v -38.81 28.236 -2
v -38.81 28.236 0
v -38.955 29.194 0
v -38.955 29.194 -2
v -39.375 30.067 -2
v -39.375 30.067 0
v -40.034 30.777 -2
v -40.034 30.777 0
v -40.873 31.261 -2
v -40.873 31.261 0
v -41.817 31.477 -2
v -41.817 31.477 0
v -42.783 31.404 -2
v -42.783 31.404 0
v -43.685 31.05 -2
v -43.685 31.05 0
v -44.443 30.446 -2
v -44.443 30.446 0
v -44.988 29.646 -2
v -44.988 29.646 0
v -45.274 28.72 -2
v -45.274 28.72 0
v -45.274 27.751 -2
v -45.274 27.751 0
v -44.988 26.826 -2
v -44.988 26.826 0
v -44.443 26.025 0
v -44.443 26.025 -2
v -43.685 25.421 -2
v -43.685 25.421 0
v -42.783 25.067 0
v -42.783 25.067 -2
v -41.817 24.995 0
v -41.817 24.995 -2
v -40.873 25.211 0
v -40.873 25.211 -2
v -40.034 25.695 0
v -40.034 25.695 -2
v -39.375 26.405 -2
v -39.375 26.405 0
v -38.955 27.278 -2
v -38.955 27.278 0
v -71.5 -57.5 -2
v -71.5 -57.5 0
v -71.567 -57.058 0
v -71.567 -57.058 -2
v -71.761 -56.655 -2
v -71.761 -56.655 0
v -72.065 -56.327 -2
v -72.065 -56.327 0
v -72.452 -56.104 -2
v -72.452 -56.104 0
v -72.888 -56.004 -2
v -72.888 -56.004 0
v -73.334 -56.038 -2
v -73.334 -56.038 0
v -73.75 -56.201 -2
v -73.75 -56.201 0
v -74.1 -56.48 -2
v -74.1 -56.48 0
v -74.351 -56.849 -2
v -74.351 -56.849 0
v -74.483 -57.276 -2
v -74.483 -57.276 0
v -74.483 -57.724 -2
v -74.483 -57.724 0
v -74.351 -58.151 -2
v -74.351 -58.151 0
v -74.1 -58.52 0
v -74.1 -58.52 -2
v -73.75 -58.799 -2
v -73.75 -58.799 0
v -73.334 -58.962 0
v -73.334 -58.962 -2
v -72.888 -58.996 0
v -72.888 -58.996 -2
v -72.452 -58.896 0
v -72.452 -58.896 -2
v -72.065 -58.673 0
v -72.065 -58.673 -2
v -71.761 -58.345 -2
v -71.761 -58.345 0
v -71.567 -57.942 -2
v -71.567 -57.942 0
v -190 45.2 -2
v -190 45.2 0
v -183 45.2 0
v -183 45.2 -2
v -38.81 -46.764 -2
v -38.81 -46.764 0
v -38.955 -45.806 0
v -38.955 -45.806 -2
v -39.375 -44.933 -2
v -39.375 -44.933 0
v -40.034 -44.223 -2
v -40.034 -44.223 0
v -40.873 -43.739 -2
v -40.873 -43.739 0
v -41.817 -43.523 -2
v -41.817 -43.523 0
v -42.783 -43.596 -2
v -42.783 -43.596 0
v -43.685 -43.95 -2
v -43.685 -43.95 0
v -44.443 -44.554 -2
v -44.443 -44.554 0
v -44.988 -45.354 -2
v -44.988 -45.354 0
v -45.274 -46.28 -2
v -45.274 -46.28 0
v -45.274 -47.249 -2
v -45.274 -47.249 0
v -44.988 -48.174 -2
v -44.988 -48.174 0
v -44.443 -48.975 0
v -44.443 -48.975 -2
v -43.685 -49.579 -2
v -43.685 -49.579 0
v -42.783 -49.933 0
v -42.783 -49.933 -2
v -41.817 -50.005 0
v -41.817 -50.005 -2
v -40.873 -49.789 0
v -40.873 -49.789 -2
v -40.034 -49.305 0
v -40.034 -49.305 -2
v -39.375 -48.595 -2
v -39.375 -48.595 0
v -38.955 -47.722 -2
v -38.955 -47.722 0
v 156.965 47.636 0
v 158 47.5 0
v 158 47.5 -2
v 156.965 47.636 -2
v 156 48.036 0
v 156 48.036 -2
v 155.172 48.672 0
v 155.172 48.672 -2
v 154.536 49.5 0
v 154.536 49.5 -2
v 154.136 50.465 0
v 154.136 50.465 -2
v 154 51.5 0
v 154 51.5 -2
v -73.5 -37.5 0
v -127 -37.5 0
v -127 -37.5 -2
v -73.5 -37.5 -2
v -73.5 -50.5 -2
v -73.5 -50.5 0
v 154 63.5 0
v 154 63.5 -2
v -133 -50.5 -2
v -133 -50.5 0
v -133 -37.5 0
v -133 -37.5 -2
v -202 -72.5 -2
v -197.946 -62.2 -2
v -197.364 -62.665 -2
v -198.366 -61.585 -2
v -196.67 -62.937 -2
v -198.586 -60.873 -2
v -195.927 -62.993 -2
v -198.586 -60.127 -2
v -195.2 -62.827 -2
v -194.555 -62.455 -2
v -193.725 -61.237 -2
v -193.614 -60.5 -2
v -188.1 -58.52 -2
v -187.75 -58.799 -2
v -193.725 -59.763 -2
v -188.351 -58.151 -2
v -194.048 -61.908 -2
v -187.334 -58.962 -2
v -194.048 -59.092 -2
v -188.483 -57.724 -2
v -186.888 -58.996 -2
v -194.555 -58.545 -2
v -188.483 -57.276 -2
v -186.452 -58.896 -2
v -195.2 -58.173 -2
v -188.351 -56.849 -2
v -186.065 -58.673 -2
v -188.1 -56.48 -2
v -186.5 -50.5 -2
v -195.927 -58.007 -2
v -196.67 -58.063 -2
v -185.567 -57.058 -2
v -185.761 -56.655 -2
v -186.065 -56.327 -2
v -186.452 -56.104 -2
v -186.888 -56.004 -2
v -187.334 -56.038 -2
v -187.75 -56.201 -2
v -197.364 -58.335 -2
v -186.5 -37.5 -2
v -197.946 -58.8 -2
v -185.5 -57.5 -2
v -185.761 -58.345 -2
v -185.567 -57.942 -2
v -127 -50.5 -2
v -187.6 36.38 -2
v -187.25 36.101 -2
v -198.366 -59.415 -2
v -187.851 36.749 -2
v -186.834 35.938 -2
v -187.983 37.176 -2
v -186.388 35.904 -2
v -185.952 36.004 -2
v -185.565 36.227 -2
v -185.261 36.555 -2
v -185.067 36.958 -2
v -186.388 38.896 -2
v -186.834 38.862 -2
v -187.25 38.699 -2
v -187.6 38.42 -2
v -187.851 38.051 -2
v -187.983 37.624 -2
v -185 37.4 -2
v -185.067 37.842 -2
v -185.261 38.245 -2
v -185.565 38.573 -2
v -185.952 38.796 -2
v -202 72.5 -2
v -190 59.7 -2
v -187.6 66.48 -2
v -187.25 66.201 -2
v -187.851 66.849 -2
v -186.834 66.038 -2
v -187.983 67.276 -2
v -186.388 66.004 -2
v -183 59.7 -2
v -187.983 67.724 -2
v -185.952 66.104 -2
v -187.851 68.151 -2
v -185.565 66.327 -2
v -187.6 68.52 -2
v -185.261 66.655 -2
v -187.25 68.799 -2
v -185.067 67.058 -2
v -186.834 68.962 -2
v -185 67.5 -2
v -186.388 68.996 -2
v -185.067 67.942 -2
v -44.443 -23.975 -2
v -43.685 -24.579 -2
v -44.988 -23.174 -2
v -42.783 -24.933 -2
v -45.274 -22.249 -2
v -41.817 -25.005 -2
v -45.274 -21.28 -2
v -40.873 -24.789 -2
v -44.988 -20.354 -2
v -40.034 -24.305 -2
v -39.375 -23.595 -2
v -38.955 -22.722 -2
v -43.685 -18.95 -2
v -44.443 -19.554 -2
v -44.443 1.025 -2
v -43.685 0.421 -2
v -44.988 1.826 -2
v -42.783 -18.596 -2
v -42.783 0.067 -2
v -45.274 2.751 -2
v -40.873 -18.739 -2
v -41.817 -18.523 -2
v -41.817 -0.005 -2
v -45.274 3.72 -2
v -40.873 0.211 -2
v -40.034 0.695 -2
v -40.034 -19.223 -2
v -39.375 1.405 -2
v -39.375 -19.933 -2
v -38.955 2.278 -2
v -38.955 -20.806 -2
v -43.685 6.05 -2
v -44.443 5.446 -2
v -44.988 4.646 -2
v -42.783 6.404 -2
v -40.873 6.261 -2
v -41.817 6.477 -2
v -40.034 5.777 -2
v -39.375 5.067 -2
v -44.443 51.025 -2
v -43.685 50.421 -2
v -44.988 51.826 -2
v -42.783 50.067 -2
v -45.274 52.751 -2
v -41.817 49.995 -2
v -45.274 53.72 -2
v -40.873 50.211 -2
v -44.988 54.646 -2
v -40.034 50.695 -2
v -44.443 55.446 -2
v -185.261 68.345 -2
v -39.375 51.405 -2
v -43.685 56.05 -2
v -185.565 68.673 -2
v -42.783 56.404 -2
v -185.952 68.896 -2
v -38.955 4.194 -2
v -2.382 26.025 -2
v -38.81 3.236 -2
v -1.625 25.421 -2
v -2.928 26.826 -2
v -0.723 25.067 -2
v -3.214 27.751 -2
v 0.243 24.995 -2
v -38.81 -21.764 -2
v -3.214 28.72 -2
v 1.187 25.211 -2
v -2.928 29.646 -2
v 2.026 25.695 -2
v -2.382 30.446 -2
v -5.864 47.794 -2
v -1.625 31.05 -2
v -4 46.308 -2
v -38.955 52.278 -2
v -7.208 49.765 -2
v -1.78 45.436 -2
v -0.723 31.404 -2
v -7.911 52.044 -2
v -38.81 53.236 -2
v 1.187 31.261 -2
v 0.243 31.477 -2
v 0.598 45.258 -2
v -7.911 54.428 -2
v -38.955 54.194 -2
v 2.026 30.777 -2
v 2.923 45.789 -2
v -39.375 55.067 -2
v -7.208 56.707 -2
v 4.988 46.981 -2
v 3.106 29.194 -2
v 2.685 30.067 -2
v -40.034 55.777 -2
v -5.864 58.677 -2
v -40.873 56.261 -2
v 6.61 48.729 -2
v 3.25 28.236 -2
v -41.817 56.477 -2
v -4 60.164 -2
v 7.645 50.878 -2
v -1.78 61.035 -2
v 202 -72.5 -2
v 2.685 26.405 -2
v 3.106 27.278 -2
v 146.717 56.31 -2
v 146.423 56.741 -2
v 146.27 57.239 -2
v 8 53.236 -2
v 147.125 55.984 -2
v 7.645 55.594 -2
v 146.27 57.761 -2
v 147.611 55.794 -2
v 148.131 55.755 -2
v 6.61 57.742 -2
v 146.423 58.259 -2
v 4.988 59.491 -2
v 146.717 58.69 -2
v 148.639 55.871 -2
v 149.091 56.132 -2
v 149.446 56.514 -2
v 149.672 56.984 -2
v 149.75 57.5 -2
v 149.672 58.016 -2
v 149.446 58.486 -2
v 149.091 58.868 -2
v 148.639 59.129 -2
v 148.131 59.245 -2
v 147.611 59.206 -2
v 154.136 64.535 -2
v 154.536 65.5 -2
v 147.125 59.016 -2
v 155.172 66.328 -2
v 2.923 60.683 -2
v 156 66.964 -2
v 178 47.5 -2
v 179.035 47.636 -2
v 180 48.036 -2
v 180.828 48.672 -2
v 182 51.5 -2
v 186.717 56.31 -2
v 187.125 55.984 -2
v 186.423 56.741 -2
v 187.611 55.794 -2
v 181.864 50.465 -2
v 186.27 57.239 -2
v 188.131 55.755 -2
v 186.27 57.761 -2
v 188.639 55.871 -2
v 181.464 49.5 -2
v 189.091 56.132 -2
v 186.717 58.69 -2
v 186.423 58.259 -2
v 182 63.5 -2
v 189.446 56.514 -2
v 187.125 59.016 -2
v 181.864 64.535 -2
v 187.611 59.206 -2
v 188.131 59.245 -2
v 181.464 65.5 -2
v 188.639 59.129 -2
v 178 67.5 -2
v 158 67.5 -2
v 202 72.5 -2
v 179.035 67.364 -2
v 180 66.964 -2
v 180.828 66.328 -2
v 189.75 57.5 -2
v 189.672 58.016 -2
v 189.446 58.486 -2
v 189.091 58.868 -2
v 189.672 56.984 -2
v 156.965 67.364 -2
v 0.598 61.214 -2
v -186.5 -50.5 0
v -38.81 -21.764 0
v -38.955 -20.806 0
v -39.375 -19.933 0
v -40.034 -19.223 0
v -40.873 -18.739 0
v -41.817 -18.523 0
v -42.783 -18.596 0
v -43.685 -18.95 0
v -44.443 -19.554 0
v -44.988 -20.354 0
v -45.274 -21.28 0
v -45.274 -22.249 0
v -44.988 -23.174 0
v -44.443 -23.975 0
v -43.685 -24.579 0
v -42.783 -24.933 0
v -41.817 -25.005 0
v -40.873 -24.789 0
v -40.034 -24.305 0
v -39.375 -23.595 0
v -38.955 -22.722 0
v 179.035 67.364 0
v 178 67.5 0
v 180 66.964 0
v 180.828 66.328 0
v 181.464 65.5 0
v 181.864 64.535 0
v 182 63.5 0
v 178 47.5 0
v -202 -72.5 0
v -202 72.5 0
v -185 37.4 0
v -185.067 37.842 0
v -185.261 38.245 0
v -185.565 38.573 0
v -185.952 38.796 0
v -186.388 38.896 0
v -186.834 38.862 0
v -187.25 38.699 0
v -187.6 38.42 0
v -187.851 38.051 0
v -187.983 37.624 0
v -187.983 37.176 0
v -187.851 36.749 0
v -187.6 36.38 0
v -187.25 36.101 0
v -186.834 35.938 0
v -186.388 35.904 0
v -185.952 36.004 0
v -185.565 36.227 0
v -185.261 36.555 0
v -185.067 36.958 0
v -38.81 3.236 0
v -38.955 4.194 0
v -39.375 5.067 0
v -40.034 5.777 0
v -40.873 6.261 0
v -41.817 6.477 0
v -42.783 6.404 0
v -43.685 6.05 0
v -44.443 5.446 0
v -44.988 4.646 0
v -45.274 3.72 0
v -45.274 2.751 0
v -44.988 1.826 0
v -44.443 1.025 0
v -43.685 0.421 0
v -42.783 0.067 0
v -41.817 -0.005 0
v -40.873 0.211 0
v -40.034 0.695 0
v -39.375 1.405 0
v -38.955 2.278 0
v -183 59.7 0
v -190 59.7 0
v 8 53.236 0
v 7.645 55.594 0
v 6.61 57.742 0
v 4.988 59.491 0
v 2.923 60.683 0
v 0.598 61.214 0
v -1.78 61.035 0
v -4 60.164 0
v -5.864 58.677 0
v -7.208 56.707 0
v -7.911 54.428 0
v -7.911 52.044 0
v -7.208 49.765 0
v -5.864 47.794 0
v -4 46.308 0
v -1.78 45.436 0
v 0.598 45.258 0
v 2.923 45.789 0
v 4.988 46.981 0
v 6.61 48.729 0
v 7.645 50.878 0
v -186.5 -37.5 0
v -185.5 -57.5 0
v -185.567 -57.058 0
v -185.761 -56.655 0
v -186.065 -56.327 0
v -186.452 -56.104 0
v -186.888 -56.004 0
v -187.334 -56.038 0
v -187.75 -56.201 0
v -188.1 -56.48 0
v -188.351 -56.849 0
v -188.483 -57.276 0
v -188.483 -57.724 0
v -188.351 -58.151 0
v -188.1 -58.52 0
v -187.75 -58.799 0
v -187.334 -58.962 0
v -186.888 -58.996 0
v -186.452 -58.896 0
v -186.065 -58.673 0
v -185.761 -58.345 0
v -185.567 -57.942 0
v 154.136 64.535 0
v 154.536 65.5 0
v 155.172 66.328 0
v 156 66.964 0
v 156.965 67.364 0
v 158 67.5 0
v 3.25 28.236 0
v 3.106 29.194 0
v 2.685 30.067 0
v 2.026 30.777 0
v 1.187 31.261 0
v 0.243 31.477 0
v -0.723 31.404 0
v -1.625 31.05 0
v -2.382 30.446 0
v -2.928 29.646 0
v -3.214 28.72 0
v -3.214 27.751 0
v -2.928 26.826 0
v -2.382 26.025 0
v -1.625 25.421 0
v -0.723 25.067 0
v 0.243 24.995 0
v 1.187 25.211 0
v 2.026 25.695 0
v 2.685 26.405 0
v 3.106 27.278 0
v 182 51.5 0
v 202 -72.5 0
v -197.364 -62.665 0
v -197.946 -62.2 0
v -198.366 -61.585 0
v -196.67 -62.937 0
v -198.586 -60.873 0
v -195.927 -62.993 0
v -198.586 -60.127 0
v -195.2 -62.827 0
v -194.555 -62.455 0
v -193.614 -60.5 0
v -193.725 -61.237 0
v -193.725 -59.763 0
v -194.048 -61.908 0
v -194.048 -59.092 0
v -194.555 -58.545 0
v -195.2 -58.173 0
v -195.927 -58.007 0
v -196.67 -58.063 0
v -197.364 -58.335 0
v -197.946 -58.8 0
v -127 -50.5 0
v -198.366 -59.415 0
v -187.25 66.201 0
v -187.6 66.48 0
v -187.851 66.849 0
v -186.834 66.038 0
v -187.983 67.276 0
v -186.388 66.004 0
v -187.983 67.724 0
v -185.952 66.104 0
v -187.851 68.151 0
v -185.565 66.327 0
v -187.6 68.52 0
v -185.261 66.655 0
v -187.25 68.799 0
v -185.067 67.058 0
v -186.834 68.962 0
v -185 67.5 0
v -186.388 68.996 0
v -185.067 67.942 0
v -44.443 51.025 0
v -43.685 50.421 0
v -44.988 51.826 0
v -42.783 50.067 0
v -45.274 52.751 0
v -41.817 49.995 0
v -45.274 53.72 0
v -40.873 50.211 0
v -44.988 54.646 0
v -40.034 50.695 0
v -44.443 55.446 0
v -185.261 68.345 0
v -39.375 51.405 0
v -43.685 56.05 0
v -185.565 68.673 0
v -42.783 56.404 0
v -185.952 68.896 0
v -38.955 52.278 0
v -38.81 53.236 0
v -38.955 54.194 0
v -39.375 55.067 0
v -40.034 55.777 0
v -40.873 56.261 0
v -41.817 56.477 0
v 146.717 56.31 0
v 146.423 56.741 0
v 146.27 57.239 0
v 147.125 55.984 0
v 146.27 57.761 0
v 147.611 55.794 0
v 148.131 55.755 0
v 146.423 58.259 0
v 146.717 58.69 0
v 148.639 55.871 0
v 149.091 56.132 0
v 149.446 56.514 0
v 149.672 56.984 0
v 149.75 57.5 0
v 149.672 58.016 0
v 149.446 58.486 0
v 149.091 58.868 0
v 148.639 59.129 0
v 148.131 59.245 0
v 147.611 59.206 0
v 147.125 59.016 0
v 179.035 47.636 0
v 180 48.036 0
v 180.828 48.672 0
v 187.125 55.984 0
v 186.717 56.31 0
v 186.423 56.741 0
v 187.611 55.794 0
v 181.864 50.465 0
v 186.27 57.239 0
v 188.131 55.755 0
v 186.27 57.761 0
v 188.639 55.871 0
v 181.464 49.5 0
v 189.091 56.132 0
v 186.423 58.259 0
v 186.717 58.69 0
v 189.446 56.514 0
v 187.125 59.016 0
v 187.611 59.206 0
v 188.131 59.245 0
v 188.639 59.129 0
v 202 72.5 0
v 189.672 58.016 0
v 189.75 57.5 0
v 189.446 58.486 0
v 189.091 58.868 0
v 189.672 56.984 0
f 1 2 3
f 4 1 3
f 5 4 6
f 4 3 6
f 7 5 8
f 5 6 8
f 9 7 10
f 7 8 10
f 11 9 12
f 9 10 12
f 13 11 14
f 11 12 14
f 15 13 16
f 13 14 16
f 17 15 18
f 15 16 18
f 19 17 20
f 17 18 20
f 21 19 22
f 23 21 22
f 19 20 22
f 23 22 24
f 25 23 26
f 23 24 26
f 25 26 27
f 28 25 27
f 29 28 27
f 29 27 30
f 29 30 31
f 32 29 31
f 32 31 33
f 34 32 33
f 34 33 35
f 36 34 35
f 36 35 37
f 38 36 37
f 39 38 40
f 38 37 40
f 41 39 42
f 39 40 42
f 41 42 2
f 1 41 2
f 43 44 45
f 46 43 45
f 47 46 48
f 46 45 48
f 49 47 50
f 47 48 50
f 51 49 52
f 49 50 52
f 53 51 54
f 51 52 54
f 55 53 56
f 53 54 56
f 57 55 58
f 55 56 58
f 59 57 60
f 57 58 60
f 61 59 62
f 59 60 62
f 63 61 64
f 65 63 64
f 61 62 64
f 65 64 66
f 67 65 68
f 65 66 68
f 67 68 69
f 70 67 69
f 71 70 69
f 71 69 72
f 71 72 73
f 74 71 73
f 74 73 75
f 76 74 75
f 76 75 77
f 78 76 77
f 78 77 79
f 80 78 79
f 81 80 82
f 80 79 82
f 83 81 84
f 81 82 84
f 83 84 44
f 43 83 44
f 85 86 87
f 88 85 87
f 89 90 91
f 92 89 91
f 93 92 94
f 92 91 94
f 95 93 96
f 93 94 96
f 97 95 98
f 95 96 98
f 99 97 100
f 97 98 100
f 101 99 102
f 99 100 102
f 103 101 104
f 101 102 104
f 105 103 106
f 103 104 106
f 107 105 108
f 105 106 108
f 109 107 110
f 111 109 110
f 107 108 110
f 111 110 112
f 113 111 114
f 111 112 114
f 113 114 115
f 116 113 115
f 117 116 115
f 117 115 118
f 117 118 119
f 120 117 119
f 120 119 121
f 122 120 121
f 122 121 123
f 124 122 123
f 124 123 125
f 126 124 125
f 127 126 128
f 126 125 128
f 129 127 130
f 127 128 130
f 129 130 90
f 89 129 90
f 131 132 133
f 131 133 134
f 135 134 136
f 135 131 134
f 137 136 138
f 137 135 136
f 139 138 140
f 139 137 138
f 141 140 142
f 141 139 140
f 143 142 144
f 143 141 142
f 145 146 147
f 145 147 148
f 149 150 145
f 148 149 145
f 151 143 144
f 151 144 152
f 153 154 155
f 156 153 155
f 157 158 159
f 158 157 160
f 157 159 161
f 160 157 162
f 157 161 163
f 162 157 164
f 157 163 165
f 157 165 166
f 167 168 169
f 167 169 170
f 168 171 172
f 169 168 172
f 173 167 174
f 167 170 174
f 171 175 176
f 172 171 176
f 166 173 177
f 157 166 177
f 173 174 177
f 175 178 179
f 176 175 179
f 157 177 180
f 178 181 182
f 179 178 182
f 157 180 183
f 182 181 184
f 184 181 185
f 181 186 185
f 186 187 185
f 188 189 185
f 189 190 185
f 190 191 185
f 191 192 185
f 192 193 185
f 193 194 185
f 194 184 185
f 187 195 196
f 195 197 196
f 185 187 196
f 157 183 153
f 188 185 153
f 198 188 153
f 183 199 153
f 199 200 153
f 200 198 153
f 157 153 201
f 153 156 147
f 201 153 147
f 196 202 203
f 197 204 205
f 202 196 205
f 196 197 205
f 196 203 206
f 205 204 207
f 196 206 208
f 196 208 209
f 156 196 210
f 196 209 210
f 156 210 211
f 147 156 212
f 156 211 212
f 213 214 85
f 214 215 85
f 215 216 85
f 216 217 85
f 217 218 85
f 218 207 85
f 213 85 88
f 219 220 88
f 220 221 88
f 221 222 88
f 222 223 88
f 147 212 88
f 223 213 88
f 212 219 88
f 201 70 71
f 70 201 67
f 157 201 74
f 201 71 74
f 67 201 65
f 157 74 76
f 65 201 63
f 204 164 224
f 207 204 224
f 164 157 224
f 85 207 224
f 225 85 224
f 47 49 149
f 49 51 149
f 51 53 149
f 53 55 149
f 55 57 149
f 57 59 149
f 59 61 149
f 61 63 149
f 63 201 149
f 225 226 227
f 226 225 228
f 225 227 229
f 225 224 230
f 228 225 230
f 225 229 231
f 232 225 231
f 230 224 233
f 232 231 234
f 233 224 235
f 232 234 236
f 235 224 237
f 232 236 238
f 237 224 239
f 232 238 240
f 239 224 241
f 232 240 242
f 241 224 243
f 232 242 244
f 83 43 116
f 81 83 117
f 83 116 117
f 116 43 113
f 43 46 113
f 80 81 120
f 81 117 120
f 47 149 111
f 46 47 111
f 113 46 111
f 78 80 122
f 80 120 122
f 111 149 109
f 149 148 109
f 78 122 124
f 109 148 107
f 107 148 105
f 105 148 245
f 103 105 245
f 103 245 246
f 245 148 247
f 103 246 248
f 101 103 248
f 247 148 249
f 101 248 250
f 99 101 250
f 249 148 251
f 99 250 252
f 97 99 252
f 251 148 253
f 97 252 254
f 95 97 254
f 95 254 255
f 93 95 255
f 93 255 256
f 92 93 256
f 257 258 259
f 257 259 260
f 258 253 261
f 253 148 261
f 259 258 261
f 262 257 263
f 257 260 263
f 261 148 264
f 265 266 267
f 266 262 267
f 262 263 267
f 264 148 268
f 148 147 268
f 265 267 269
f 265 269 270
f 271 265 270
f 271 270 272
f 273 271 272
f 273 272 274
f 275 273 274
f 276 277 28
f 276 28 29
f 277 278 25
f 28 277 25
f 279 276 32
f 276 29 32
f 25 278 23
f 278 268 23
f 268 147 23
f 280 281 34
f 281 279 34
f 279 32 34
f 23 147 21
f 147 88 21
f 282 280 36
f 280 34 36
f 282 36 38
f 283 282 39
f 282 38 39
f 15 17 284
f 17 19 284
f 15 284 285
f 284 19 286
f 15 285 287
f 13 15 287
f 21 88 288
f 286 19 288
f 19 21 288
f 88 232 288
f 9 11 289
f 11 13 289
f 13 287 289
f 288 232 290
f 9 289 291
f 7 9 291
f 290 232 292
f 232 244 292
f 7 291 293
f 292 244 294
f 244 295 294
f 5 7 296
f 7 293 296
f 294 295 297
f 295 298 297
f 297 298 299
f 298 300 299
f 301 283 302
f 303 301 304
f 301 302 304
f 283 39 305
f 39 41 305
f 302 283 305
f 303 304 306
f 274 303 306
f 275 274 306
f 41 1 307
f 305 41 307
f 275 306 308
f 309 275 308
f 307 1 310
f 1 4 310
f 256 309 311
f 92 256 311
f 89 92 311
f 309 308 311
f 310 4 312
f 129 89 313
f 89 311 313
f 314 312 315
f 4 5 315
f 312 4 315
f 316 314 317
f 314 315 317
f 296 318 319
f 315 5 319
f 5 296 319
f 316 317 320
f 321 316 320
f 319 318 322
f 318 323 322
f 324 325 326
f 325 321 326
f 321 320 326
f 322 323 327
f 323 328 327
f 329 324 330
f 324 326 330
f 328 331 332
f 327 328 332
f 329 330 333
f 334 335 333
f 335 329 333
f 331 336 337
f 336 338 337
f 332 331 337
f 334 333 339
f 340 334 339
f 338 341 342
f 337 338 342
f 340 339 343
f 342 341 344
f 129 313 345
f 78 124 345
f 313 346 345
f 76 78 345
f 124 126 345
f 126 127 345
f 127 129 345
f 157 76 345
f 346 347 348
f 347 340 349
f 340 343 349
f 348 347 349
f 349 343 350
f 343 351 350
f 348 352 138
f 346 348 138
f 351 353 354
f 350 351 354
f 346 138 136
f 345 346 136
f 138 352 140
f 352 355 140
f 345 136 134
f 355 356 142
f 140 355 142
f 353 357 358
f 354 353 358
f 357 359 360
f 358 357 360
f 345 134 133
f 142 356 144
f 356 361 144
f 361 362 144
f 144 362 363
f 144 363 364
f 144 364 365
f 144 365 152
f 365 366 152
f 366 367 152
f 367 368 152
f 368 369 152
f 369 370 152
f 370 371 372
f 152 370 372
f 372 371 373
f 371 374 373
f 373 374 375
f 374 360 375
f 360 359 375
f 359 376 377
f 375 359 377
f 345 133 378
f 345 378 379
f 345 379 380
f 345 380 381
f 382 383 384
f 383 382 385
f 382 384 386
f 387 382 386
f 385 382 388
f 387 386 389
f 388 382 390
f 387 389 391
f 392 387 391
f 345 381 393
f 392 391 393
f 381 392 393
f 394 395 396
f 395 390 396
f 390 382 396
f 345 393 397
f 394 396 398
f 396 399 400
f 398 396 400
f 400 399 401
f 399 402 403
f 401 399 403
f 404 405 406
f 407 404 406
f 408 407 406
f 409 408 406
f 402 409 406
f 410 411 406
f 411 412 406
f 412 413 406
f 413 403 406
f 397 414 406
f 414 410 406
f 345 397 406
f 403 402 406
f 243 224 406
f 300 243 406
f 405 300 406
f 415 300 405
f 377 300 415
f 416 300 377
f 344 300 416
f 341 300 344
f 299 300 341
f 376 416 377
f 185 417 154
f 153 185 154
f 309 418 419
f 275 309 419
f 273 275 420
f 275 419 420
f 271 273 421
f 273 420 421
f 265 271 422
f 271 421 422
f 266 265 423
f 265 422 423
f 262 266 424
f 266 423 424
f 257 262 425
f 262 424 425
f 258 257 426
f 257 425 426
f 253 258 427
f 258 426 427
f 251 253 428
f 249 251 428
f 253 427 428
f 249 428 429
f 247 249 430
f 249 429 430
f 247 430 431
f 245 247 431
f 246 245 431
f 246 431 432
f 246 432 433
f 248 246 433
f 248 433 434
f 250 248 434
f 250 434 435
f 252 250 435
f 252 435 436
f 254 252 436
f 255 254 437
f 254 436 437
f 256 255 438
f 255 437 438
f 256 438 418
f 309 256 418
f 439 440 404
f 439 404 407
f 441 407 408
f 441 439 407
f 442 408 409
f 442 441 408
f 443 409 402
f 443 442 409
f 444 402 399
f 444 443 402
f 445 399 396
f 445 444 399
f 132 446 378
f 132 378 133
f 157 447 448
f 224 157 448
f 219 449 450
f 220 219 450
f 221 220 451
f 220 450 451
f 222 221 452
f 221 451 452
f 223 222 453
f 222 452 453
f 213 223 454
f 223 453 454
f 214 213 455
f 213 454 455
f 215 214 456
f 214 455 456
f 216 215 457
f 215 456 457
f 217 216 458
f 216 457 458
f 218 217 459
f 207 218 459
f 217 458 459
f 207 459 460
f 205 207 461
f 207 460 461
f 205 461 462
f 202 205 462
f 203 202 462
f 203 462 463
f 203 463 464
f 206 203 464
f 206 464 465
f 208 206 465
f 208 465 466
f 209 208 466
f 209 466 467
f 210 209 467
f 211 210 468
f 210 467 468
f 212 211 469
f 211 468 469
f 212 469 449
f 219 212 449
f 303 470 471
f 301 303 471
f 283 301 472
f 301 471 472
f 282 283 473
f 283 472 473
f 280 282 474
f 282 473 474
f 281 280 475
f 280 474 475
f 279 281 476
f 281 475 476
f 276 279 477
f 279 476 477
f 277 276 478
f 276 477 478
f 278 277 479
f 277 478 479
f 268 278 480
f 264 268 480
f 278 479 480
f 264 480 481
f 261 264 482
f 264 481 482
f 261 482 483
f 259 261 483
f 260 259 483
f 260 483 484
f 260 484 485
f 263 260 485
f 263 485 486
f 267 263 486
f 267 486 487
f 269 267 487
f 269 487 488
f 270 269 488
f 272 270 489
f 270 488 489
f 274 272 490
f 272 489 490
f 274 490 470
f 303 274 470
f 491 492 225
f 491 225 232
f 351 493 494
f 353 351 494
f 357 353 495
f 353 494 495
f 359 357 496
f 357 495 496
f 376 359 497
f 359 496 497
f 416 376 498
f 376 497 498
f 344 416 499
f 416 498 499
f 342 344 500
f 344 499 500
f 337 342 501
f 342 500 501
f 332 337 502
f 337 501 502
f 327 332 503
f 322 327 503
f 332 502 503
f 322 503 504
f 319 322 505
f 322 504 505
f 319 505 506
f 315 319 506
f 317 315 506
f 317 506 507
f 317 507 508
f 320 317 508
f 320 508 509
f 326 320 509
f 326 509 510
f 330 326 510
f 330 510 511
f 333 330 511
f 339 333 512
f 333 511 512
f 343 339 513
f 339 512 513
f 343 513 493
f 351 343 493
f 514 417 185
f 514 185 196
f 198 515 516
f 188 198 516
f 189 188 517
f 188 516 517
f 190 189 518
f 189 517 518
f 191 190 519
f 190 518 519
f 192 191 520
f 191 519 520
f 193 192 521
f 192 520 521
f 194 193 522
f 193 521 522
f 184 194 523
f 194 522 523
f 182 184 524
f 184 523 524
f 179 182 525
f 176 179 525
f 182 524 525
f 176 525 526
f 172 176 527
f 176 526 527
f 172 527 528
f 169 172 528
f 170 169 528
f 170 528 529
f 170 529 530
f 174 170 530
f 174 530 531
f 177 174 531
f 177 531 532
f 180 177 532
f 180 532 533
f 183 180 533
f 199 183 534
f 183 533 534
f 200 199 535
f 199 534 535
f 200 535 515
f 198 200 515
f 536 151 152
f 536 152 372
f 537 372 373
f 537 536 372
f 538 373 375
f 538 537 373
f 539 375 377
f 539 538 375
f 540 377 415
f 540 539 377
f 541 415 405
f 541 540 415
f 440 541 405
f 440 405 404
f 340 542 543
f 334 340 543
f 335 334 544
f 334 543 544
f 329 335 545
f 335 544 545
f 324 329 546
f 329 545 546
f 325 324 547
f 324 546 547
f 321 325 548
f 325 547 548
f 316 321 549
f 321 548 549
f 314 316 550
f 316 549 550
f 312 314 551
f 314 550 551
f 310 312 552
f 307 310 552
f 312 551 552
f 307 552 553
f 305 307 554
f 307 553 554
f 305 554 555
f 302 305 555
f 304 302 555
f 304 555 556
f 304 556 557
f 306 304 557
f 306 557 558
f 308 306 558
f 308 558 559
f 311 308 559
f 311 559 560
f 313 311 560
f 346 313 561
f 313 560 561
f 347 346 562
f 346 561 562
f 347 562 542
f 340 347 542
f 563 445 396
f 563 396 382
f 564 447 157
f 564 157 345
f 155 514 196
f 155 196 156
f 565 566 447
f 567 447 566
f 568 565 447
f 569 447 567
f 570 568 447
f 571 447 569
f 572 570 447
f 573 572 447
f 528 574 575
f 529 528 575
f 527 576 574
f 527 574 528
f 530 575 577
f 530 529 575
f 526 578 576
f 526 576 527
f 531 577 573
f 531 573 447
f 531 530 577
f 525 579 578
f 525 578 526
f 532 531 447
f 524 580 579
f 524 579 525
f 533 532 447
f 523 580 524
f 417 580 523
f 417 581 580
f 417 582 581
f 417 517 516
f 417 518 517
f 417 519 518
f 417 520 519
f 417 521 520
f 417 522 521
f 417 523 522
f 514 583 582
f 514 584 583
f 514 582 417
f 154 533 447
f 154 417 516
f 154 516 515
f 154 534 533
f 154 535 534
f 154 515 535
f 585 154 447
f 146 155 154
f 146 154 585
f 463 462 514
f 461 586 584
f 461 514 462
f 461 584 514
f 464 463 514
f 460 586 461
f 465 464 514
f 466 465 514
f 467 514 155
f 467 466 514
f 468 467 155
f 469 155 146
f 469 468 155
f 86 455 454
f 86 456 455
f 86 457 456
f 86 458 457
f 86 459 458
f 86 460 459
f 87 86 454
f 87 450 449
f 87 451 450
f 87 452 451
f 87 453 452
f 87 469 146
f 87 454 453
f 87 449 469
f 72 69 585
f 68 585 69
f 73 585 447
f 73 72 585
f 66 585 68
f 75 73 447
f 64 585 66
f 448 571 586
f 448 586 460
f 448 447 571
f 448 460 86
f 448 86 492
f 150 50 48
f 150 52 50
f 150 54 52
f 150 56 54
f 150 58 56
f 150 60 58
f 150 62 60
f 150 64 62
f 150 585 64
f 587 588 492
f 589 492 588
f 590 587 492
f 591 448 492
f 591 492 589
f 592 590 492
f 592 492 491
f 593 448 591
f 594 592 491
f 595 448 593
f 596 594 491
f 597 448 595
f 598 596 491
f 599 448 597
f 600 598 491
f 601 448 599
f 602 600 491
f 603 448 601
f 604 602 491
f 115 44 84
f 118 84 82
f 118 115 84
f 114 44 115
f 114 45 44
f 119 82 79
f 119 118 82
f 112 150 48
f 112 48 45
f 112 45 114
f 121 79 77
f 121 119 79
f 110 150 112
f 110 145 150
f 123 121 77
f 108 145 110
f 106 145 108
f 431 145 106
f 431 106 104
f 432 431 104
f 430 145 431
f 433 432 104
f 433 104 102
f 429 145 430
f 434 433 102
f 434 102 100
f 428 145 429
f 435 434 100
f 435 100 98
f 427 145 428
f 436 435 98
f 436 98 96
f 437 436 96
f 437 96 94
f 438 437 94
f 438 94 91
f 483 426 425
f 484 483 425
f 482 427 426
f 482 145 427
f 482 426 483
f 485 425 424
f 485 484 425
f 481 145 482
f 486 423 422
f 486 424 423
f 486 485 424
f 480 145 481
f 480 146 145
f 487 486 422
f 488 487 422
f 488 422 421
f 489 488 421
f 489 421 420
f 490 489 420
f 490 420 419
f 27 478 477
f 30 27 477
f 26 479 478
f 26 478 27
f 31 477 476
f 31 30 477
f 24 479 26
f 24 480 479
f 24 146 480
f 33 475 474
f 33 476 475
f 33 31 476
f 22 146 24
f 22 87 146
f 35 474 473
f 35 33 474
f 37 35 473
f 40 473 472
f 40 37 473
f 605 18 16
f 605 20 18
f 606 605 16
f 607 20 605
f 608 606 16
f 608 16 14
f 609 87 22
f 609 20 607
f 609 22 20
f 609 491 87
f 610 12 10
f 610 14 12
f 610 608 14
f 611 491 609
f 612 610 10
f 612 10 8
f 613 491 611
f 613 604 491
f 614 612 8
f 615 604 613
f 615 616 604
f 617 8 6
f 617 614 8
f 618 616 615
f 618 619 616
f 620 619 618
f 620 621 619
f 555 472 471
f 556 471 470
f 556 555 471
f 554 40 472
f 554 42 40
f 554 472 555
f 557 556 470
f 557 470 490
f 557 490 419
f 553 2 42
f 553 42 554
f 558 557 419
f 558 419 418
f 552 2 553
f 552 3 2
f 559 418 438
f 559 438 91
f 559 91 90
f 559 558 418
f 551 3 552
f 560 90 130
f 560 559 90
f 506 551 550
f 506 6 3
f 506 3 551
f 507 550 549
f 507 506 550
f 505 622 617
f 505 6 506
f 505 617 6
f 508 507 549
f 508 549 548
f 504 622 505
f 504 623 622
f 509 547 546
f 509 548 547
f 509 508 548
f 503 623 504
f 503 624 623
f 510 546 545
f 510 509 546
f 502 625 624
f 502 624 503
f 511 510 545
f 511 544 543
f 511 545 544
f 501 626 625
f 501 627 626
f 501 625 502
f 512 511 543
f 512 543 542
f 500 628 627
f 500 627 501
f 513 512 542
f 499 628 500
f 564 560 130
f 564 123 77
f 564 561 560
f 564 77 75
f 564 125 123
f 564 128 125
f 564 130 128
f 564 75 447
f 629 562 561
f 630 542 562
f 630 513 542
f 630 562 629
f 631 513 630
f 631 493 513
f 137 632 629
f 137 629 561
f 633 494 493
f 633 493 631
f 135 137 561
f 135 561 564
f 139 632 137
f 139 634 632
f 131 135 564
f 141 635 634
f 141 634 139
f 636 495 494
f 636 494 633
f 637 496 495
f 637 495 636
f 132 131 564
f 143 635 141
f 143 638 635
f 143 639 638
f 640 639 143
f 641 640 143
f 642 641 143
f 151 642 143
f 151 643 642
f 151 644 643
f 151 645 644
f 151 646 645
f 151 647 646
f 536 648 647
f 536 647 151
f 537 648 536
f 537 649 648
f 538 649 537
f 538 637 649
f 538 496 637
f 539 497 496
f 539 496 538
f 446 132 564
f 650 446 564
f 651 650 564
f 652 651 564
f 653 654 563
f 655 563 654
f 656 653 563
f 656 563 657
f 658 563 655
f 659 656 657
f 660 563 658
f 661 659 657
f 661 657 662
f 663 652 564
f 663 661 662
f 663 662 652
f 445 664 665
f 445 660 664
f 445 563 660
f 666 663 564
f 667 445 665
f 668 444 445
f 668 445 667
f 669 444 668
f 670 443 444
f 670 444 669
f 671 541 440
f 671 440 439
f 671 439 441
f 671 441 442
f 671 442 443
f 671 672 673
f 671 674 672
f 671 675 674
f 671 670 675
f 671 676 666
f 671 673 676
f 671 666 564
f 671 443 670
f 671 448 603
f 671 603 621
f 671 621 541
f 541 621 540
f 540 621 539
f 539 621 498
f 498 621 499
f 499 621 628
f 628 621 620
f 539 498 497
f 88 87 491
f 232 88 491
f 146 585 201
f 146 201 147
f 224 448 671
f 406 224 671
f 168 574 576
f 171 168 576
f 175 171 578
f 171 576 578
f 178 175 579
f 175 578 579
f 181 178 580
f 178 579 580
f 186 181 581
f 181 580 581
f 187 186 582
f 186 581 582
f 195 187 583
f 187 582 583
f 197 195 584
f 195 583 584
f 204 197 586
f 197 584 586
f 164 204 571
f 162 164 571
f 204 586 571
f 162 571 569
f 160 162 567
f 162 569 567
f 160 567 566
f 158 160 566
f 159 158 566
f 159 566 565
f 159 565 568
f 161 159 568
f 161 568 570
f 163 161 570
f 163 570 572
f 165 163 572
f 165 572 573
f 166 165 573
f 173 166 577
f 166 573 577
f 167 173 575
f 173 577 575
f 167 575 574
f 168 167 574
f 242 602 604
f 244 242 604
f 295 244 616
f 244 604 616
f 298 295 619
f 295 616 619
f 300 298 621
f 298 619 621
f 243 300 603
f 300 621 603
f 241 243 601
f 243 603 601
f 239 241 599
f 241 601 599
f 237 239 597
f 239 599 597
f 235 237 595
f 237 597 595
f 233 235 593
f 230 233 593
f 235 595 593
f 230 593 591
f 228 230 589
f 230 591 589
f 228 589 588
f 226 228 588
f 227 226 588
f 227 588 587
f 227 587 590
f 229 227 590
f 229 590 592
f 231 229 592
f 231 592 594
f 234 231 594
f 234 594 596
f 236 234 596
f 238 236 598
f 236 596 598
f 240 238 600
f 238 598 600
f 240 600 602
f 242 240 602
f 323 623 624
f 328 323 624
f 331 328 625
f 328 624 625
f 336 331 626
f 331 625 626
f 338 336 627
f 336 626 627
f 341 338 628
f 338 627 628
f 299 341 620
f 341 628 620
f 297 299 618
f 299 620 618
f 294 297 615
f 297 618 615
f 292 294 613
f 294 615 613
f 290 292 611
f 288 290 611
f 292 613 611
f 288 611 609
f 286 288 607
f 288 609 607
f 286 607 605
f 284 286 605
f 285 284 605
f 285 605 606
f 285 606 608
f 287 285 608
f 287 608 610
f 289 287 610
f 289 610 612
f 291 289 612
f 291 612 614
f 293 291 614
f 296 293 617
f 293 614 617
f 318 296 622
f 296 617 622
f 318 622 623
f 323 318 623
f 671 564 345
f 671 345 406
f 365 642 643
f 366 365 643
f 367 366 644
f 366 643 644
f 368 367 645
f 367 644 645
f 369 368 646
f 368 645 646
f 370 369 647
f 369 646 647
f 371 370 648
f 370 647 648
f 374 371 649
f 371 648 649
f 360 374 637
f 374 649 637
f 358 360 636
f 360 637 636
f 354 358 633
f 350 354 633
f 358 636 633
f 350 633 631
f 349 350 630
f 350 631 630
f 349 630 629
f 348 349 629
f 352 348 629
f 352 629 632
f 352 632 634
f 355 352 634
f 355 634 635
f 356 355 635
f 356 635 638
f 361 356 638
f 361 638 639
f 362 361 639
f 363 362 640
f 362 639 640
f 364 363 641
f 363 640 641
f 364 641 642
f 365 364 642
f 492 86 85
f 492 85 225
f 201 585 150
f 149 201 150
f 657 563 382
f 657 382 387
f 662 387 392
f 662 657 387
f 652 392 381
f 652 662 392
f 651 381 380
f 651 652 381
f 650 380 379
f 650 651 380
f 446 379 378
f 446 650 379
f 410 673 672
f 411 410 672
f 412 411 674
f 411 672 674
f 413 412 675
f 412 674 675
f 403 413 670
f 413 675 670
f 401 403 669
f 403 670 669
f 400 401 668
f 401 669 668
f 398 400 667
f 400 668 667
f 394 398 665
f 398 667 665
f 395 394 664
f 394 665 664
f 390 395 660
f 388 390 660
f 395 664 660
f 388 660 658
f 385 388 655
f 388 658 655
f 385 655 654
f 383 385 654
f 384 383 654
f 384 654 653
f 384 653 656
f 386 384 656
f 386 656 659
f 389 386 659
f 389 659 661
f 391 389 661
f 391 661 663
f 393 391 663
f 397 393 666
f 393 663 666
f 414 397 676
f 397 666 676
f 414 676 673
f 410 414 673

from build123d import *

# Parameters (mm, degrees)
F0_W     = 404
F0_H     = 145
F0_R     = 2.5
F0_R_2   = 1.5
F0_W_2   = 53.5
F0_H_2   = 13
F0_R_3   = 3.25
F0_W_3   = 7
F0_H_3   = 14.5
F0_R_4   = 8
F0_R_5   = 1.75
F1_DEPTH = 2


with BuildPart() as f1:
    # F0 (on Top) → F1 (new body)
    with BuildSketch(Plane.XY):
        Rectangle(F0_W, F0_H)
        with Locations((-196.113765, -60.5)):
            Circle(F0_R, mode=Mode.SUBTRACT)
        with Locations((-187, -57.5)):
            Circle(F0_R_2, mode=Mode.SUBTRACT)
        with Locations((-159.75, -44)):
            Rectangle(F0_W_2, F0_H_2, mode=Mode.SUBTRACT)
        with Locations((-73, -57.5)):
            Circle(F0_R_2, mode=Mode.SUBTRACT)
        with Locations((-100.25, -44)):
            Rectangle(F0_W_2, F0_H_2, mode=Mode.SUBTRACT)
        with Locations((-42.060282, -46.764122)):
            Circle(F0_R_3, mode=Mode.SUBTRACT)
        with Locations((-42.060282, -21.764122)):
            Circle(F0_R_3, mode=Mode.SUBTRACT)
        with Locations((-42.060282, 3.235878)):
            Circle(F0_R_3, mode=Mode.SUBTRACT)
        with Locations((-42.060282, 28.235878)):
            Circle(F0_R_3, mode=Mode.SUBTRACT)
        with Locations((-186.5, 37.4)):
            Circle(F0_R_2, mode=Mode.SUBTRACT)
        with Locations((-186.5, 52.45)):
            Rectangle(F0_W_3, F0_H_3, mode=Mode.SUBTRACT)
        with Locations((-186.5, 67.5)):
            Circle(F0_R_2, mode=Mode.SUBTRACT)
        with Locations((-42.060282, 53.235878)):
            Circle(F0_R_3, mode=Mode.SUBTRACT)
        with Locations((0, 28.235878)):
            Circle(F0_R_3, mode=Mode.SUBTRACT)
        with Locations((0, 53.235878)):
            Circle(F0_R_4, mode=Mode.SUBTRACT)
        with Locations((148, 57.5)):
            Circle(F0_R_5, mode=Mode.SUBTRACT)
        with BuildLine():
            ThreePointArc((182, 51.5), (180.828427, 48.671573), (178, 47.5))
            Line((178, 47.5), (158, 47.5))
            ThreePointArc((158, 47.5), (155.171573, 48.671573), (154, 51.5))
            Line((154, 51.5), (154, 63.5))
            ThreePointArc((154, 63.5), (155.171573, 66.328427), (158, 67.5))
            Line((158, 67.5), (178, 67.5))
            ThreePointArc((178, 67.5), (180.828427, 66.328427), (182, 63.5))
            Line((182, 63.5), (182, 51.5))
        make_face(mode=Mode.SUBTRACT)
        with Locations((188, 57.5)):
            Circle(F0_R_5, mode=Mode.SUBTRACT)
    extrude(amount=-F1_DEPTH)


solid = f1.part
